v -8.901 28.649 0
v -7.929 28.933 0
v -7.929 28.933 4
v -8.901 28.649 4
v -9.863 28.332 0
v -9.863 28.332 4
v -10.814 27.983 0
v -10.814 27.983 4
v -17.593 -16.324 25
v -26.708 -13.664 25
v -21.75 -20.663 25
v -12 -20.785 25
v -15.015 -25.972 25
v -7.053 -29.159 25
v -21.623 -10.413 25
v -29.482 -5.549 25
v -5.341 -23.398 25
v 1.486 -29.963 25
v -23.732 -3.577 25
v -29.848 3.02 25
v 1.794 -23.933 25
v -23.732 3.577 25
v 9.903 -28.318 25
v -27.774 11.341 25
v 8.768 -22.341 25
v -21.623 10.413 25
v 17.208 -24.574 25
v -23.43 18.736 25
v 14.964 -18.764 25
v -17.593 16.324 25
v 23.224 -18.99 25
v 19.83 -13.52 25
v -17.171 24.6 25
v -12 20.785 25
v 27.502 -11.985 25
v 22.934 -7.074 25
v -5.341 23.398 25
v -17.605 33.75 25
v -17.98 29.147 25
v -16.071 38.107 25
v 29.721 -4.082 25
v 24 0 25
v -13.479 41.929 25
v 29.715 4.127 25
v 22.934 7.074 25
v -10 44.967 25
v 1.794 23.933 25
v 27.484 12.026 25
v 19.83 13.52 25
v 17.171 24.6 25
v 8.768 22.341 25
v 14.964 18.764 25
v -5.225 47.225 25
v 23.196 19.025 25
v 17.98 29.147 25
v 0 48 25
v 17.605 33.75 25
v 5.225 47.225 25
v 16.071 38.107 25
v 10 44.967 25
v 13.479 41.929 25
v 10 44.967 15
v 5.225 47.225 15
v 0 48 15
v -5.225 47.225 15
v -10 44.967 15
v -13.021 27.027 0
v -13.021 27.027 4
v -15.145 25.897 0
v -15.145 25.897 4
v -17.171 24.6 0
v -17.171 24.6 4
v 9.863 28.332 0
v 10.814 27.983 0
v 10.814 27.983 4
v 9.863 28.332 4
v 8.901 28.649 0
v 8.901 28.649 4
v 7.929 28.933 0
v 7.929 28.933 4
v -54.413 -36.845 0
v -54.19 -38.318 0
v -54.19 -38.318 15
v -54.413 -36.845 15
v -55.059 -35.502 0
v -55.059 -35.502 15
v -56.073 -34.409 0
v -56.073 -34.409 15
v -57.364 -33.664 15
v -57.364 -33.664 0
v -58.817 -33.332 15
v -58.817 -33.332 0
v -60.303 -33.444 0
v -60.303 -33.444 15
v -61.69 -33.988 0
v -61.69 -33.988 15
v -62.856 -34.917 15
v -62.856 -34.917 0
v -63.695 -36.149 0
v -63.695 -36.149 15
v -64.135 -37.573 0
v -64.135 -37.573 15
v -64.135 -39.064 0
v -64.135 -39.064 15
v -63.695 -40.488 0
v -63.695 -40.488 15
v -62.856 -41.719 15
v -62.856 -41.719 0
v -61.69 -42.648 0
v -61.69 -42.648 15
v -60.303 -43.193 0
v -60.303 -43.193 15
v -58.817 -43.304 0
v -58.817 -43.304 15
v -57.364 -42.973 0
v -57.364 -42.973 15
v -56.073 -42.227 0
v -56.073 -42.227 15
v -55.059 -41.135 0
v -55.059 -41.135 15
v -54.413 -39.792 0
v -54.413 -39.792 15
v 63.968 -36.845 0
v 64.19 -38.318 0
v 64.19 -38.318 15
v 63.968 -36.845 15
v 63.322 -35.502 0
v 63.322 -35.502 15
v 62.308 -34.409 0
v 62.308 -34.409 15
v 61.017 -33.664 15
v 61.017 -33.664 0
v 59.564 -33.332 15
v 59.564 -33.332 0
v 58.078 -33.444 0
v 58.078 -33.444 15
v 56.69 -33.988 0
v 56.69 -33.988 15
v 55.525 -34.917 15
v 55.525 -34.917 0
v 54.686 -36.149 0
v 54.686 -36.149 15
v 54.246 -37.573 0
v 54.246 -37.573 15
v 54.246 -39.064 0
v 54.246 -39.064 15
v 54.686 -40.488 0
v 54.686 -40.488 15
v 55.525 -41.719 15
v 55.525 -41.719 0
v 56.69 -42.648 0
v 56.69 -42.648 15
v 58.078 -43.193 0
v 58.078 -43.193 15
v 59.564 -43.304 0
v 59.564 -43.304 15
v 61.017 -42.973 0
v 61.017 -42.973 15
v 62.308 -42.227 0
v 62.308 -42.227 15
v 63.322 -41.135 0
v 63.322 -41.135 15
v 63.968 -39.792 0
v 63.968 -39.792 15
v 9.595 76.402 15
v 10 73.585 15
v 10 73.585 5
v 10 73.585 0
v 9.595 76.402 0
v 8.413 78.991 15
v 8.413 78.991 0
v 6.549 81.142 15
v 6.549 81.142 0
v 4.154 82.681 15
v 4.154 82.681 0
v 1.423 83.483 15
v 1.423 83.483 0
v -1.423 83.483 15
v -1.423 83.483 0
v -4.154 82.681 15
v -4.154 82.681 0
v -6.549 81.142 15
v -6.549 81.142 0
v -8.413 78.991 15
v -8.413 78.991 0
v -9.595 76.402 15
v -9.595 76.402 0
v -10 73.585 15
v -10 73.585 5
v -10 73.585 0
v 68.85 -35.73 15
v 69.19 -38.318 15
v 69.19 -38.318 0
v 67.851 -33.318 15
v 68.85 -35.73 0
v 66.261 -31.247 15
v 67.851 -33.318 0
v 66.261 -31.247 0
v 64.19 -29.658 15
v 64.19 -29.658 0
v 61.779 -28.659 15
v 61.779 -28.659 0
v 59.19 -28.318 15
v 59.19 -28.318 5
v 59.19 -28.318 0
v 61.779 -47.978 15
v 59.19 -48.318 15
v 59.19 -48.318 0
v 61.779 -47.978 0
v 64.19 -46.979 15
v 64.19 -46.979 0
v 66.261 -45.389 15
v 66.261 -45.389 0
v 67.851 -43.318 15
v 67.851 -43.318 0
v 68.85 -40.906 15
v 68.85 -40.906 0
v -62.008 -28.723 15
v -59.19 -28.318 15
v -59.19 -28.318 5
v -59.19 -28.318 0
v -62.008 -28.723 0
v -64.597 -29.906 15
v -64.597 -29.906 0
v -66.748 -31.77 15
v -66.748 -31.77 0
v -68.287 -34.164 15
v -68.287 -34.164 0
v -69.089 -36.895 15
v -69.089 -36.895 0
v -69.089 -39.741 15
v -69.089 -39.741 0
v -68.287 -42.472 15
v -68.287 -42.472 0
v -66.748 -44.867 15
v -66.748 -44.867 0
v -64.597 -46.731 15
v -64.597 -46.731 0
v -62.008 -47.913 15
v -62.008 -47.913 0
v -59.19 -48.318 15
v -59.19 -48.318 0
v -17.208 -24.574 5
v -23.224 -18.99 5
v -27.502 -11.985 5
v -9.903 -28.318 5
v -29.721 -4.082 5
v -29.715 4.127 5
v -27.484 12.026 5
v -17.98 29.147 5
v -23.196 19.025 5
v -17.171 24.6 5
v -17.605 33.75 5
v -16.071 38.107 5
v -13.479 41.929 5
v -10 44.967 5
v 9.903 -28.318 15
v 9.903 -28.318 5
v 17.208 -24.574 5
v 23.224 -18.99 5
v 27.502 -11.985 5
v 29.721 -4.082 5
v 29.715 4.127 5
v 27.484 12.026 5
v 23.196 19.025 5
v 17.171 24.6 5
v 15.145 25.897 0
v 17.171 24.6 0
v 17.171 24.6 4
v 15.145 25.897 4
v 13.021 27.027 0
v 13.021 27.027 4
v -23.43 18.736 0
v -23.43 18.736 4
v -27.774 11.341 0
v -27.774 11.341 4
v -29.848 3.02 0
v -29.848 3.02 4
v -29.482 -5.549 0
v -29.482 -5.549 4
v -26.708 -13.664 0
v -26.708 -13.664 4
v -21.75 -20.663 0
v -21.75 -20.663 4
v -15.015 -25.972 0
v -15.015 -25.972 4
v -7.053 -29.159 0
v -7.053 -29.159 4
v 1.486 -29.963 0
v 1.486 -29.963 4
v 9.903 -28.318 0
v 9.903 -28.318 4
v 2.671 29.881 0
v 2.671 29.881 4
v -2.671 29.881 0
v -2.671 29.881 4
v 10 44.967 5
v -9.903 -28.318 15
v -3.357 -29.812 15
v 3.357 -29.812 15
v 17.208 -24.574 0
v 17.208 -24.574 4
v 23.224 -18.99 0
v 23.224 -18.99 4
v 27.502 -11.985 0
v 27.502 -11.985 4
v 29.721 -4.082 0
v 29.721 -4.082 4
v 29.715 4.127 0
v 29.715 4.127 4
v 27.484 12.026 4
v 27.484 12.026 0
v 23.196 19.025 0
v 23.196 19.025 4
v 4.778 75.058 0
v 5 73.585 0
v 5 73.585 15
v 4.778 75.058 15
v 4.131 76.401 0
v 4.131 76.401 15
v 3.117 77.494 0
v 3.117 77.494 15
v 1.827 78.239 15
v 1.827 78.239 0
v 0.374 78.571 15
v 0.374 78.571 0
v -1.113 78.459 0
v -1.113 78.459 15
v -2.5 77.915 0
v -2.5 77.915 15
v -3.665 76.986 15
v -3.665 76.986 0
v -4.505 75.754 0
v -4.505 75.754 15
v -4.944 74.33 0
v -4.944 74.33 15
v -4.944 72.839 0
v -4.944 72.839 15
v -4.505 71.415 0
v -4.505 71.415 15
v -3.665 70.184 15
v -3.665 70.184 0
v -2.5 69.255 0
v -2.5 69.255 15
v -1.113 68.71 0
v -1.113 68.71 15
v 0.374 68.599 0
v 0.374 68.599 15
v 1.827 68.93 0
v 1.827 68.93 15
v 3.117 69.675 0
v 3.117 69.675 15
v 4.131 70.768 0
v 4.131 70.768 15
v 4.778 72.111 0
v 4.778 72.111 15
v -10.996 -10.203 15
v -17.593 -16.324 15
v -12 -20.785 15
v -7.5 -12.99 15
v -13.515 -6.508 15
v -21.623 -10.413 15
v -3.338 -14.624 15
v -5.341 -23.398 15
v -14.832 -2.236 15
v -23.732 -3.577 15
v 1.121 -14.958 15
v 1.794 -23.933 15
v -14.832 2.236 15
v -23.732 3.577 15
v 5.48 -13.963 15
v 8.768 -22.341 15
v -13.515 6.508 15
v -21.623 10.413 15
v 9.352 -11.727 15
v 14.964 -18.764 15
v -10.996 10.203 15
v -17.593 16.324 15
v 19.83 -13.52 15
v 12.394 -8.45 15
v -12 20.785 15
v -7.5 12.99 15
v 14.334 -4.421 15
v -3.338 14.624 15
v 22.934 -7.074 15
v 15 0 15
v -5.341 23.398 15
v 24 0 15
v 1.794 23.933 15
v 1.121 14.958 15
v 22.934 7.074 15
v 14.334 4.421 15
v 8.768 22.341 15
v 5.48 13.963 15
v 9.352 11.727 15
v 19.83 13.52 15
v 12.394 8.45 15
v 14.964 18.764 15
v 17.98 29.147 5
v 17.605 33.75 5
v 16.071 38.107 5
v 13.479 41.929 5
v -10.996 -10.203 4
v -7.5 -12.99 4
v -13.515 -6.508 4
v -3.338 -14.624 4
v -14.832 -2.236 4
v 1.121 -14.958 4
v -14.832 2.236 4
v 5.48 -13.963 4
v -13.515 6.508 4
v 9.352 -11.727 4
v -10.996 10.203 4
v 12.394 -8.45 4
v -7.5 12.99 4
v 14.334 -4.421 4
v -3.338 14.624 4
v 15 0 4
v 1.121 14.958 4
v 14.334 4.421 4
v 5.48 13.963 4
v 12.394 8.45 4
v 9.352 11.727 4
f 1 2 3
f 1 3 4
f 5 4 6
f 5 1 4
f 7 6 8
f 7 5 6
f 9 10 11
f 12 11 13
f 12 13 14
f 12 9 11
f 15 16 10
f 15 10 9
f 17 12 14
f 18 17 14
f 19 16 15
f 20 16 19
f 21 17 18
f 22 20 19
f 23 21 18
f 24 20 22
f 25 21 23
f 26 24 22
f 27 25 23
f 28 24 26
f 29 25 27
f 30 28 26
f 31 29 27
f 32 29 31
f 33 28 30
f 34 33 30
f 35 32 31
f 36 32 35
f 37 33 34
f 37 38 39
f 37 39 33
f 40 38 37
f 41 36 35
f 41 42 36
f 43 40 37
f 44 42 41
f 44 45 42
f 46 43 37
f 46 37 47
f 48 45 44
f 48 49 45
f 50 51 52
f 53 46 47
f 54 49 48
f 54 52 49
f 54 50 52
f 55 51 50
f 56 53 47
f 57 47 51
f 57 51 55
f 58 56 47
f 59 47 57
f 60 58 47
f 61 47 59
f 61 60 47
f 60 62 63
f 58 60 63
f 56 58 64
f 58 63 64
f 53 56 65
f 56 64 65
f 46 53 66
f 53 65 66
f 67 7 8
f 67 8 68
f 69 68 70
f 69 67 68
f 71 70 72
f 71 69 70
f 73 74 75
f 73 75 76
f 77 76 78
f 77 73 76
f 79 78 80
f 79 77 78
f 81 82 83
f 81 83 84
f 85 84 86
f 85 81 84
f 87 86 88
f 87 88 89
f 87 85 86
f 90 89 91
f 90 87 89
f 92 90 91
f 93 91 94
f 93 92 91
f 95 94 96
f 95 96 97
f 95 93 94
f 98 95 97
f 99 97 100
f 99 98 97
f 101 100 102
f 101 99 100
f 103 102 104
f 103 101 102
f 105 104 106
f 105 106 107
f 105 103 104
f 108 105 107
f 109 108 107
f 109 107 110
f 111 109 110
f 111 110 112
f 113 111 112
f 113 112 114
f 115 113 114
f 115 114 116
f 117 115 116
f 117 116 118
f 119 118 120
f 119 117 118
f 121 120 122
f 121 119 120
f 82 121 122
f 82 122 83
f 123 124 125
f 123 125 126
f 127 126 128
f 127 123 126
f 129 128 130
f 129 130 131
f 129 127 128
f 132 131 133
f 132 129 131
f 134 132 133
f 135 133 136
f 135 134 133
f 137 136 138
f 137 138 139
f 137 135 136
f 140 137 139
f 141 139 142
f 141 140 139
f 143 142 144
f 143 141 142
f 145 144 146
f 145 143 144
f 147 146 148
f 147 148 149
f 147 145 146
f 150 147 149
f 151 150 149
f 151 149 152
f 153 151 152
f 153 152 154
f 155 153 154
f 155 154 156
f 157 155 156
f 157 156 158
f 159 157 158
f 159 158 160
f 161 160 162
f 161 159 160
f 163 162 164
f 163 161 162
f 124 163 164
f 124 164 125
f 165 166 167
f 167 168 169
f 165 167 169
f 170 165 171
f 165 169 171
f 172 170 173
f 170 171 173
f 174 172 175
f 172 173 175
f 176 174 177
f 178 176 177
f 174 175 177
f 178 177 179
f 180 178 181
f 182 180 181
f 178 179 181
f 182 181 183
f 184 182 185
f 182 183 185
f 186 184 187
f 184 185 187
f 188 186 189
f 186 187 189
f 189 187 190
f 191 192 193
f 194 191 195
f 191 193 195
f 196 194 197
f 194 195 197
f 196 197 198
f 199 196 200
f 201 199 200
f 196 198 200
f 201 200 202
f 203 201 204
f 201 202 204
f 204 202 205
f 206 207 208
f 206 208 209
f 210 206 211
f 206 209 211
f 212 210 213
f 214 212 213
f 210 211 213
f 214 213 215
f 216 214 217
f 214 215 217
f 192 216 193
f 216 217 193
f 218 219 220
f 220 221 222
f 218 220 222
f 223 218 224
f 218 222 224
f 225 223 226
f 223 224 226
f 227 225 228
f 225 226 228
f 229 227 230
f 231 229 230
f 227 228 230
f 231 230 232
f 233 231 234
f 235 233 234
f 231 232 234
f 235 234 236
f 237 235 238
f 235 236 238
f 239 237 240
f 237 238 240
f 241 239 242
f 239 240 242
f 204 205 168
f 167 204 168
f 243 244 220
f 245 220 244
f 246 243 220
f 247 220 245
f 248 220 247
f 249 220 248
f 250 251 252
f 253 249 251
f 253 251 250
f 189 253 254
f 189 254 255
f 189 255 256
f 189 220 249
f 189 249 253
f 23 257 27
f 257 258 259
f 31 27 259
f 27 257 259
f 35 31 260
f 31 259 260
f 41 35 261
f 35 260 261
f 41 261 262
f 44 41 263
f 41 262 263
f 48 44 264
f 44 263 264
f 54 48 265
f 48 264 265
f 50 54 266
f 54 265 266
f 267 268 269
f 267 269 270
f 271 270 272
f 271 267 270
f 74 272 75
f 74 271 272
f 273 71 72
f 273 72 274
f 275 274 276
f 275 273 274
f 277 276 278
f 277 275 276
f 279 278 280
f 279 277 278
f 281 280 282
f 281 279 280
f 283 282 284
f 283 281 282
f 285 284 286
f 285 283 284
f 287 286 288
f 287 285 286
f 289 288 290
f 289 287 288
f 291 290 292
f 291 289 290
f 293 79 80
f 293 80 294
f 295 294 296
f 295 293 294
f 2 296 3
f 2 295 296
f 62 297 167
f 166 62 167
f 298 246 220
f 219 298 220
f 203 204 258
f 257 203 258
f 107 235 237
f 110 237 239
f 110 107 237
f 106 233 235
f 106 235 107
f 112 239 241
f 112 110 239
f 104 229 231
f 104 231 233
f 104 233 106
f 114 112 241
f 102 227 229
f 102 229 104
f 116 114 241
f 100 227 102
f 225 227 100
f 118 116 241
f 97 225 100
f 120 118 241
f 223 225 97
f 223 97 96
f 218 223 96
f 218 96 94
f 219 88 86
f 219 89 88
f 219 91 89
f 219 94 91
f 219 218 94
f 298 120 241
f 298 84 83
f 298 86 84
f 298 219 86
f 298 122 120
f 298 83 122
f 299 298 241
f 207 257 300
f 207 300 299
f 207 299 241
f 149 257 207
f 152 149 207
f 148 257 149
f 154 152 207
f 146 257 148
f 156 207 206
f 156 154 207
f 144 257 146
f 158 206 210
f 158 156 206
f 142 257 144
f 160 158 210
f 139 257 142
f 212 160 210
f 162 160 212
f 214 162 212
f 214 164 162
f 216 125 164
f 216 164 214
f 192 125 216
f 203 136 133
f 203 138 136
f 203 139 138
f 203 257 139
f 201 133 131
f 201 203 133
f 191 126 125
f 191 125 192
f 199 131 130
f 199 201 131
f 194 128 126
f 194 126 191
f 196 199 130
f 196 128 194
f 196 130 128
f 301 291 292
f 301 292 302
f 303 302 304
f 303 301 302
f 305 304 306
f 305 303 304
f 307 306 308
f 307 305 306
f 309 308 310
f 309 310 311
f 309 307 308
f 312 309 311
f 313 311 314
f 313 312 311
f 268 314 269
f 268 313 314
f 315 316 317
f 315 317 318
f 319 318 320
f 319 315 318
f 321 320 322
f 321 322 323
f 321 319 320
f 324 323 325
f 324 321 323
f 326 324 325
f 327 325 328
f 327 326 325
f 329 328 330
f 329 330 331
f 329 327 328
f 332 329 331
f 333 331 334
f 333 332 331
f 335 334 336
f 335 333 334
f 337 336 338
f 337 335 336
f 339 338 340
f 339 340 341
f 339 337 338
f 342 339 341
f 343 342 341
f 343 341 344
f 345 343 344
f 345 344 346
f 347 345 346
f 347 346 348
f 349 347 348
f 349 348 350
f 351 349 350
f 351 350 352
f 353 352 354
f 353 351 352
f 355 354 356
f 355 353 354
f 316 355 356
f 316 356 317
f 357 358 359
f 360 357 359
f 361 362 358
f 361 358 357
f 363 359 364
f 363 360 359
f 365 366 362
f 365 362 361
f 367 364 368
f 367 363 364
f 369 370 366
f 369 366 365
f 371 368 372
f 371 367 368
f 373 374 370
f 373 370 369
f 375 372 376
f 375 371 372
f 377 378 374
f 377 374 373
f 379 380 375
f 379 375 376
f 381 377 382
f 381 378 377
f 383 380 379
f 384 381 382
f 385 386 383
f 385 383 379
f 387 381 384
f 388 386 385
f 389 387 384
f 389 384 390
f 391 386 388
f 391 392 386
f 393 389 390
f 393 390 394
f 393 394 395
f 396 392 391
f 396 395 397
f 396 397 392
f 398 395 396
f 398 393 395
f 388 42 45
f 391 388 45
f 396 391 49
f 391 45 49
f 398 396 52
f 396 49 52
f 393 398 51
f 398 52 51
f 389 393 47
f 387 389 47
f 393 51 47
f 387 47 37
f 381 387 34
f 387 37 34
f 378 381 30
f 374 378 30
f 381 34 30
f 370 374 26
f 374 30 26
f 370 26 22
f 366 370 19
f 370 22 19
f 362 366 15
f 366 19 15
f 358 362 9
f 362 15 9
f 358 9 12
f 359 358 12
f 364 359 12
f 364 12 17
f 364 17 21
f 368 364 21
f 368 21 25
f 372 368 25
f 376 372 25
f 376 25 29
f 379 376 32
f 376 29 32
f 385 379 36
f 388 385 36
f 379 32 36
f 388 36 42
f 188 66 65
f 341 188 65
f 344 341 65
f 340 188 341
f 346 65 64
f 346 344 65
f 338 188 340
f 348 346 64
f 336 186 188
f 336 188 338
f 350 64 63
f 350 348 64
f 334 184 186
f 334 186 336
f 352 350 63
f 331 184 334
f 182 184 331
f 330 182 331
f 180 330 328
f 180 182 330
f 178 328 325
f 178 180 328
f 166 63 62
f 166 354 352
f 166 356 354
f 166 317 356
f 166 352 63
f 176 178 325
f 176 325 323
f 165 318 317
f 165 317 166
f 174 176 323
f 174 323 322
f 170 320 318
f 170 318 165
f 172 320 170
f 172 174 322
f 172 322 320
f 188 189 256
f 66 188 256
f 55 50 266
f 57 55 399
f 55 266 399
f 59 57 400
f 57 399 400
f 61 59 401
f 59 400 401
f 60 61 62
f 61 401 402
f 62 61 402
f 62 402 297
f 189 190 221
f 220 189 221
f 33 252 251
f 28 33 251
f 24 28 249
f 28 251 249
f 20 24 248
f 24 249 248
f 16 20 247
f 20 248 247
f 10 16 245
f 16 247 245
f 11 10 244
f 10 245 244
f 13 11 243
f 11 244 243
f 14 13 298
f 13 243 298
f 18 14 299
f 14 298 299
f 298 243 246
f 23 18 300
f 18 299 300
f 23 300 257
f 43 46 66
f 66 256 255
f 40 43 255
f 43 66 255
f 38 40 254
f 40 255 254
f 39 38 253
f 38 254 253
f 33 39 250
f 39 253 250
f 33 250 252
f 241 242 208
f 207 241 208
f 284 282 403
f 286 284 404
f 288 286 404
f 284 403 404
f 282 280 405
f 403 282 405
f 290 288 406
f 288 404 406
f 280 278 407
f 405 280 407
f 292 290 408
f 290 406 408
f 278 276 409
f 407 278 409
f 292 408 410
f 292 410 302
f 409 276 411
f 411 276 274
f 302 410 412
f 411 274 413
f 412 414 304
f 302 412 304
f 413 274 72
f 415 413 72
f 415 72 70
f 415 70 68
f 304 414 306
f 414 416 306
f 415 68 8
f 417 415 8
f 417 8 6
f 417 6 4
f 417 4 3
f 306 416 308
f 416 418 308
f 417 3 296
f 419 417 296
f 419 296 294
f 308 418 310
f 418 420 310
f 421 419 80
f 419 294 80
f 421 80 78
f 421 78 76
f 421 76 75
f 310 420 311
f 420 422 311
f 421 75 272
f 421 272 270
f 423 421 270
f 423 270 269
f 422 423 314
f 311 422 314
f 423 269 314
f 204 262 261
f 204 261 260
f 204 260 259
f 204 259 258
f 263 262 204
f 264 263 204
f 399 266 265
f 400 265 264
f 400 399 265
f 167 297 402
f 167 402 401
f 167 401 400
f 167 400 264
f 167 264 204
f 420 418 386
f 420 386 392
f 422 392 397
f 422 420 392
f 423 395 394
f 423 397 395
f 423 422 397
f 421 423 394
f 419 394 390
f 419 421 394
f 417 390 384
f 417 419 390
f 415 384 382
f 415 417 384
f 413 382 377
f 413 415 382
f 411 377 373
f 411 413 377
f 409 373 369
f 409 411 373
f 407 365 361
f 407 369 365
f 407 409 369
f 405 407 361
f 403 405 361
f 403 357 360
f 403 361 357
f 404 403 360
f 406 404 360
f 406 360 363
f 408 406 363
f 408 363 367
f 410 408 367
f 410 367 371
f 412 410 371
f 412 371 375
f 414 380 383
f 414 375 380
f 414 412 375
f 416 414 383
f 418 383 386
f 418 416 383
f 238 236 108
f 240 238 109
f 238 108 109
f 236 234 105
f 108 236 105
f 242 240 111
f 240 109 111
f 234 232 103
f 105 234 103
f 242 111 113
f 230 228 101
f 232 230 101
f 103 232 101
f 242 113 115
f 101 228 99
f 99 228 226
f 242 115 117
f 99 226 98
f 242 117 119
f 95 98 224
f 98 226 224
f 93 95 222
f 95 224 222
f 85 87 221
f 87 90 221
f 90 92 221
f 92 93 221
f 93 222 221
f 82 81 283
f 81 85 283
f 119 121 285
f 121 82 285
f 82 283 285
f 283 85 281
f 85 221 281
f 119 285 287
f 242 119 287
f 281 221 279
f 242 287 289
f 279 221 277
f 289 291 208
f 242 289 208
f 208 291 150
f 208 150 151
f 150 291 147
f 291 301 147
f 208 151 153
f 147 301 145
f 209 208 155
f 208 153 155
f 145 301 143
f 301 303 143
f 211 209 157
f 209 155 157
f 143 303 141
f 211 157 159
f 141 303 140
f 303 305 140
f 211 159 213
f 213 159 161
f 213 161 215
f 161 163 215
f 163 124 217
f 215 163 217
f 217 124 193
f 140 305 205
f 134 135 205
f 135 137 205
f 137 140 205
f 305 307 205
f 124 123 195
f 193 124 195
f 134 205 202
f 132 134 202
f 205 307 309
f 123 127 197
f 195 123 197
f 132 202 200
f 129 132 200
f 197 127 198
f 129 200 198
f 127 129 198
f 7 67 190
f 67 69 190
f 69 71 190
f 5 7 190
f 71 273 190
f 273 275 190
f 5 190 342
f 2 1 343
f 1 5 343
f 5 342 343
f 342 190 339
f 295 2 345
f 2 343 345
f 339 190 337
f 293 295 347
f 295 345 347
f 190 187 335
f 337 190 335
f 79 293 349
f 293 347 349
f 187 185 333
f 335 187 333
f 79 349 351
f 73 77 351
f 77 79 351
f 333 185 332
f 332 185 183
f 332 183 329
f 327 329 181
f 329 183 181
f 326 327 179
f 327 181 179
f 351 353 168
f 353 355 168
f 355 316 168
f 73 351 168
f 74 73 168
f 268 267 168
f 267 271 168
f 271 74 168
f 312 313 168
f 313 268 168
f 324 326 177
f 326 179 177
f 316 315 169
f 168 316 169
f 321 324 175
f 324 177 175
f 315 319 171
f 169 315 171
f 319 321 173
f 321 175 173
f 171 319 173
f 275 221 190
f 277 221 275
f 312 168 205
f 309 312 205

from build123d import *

# Parameters (mm, degrees)
F0_R     = 18
F0_R_2   = 15
F1_DEPTH = 25
F0_R_3   = 5
F2_DEPTH = 15
F3_DEPTH = 5
F4_R     = 24
F5_DEPTH = 10
F6_R     = 18
F7_DEPTH = 4
F8_DEPTH = 25


# Not quite as in the source:
# - a feature of the source that left no trace in its solid (it failed there, or was rolled back) is left out


with BuildPart() as f1:
    # F0 (on Top) → F1 (new body)
    with BuildSketch(Plane.XY):
        with BuildLine():
            ThreePointArc((11, 30), (10.9532905474, 28.9873667079), (10.8135588756, 27.9833333333))
            ThreePointArc((10.8135588756, 27.9833333333), (14.0941228696, 26.4831210498), (17.1709056255, 24.6))
            ThreePointArc((17.1709056255, 24.6), (16.9783517429, 35.9779237278), (10, 44.9666295471))
            ThreePointArc((10, 44.9666295471), (0, 48), (-10, 44.9666295471))
            ThreePointArc((-10, 44.9666295471), (-16.9783517429, 35.9779237278), (-17.1709056255, 24.6))
            ThreePointArc((-17.1709056255, 24.6), (-14.0941228696, 26.4831210498), (-10.8135588756, 27.9833333333))
            ThreePointArc((-10.8135588756, 27.9833333333), (-1.0126332921, 40.9532905474), (11, 30))
        make_face()
        with BuildLine():
            ThreePointArc((-7.9285699986, 28.9333333333), (0, 30), (7.9285699986, 28.9333333333))
            ThreePointArc((7.9285699986, 28.9333333333), (7.9821225244, 29.4654721656), (8, 30))
            ThreePointArc((8, 30), (-0.5345278344, 37.9821225244), (-7.9285699986, 28.9333333333))
        make_face()
        with BuildLine():
            ThreePointArc((7.9285699986, 28.9333333333), (9.3830951015, 28.4948684208), (10.8135588756, 27.9833333333))
            ThreePointArc((10.8135588756, 27.9833333333), (10.9532905474, 28.9873667079), (11, 30))
            ThreePointArc((11, 30), (-1.0126332921, 40.9532905474), (-10.8135588756, 27.9833333333))
            ThreePointArc((-10.8135588756, 27.9833333333), (-9.3830951015, 28.4948684208), (-7.9285699986, 28.9333333333))
            ThreePointArc((-7.9285699986, 28.9333333333), (-0.5345278344, 37.9821225244), (8, 30))
            ThreePointArc((8, 30), (7.9821225244, 29.4654721656), (7.9285699986, 28.9333333333))
        make_face()
        with BuildLine():
            ThreePointArc((8.1236109924, 22.5833333333), (19.6337294447, 13.8027775499), (24, 0))
            ThreePointArc((24, 0), (-13.8027775499, -19.6337294447), (-8.1236109924, 22.5833333333))
            ThreePointArc((-8.1236109924, 22.5833333333), (-9.8460195334, 25.0953186293), (-10.8135588756, 27.9833333333))
            ThreePointArc((-10.8135588756, 27.9833333333), (-14.0941228696, 26.4831210498), (-17.1709056255, 24.6))
            ThreePointArc((-17.1709056255, 24.6), (-29.7210146782, -4.0818239184), (-9.9032129289, -28.3183045694))
            ThreePointArc((-9.9032129289, -28.3183045694), (0, -30), (9.9032129289, -28.3183045694))
            ThreePointArc((9.9032129289, -28.3183045694), (24.4652446122, -17.3623675248), (30, 0))
            ThreePointArc((30, 0), (26.6000673755, 13.8721453142), (17.1709056255, 24.6))
            ThreePointArc((17.1709056255, 24.6), (14.0941228696, 26.4831210498), (10.8135588756, 27.9833333333))
            ThreePointArc((10.8135588756, 27.9833333333), (9.8460195334, 25.0953186293), (8.1236109924, 22.5833333333))
        make_face()
        with BuildLine():
            ThreePointArc((-8.1236109924, 22.5833333333), (-13.8027775499, -19.6337294447), (24, 0))
            ThreePointArc((24, 0), (19.6337294447, 13.8027775499), (8.1236109924, 22.5833333333))
            ThreePointArc((8.1236109924, 22.5833333333), (0, 19), (-8.1236109924, 22.5833333333))
        make_face()
        Circle(F0_R, mode=Mode.SUBTRACT)
        Circle(F0_R)
        Circle(F0_R_2, mode=Mode.SUBTRACT)
        Circle(F0_R_2)
        with BuildLine():
            ThreePointArc((-8.1236109924, 22.5833333333), (0, 19), (8.1236109924, 22.5833333333))
            ThreePointArc((8.1236109924, 22.5833333333), (6.4342628666, 23.1214242936), (4.7098006563, 23.5333333333))
            ThreePointArc((4.7098006563, 23.5333333333), (0, 22), (-4.7098006563, 23.5333333333))
            ThreePointArc((-4.7098006563, 23.5333333333), (-6.4342628666, 23.1214242936), (-8.1236109924, 22.5833333333))
        make_face()
        with BuildLine():
            ThreePointArc((4.7098006563, 23.5333333333), (6.4342628666, 23.1214242936), (8.1236109924, 22.5833333333))
            ThreePointArc((8.1236109924, 22.5833333333), (9.8460195334, 25.0953186293), (10.8135588756, 27.9833333333))
            ThreePointArc((10.8135588756, 27.9833333333), (9.3830951015, 28.4948684208), (7.9285699986, 28.9333333333))
            ThreePointArc((7.9285699986, 28.9333333333), (6.8718340494, 25.9039168957), (4.7098006563, 23.5333333333))
        make_face()
        with BuildLine():
            ThreePointArc((-10.8135588756, 27.9833333333), (-9.8460195334, 25.0953186293), (-8.1236109924, 22.5833333333))
            ThreePointArc((-8.1236109924, 22.5833333333), (-6.4342628666, 23.1214242936), (-4.7098006563, 23.5333333333))
            ThreePointArc((-4.7098006563, 23.5333333333), (-6.8718340494, 25.9039168957), (-7.9285699986, 28.9333333333))
            ThreePointArc((-7.9285699986, 28.9333333333), (-9.3830951015, 28.4948684208), (-10.8135588756, 27.9833333333))
        make_face()
        with BuildLine():
            ThreePointArc((-4.7098006563, 23.5333333333), (0, 24), (4.7098006563, 23.5333333333))
            ThreePointArc((4.7098006563, 23.5333333333), (6.8718340494, 25.9039168957), (7.9285699986, 28.9333333333))
            ThreePointArc((7.9285699986, 28.9333333333), (0, 30), (-7.9285699986, 28.9333333333))
            ThreePointArc((-7.9285699986, 28.9333333333), (-6.8718340494, 25.9039168957), (-4.7098006563, 23.5333333333))
        make_face()
        with BuildLine():
            ThreePointArc((-4.7098006563, 23.5333333333), (0, 22), (4.7098006563, 23.5333333333))
            ThreePointArc((4.7098006563, 23.5333333333), (0, 24), (-4.7098006563, 23.5333333333))
        make_face()
    extrude(amount=F1_DEPTH)

    # F0 (on Top) → F2 (join)
    with BuildSketch(Plane.XY):
        with BuildLine():
            ThreePointArc((9.9032129289, -28.3183045694), (0, -30), (-9.9032129289, -28.3183045694))
            Line((-9.9032129289, -28.3183045694), (-59.1904185712, -28.3183045694))
            ThreePointArc((-59.1904185712, -28.3183045694), (-52.1193507594, -31.2472367575), (-49.1904185712, -38.3183045694))
            ThreePointArc((-49.1904185712, -38.3183045694), (-52.1193507594, -45.3893723813), (-59.1904185712, -48.3183045694))
            Line((-59.1904185712, -48.3183045694), (0, -48.3183045694))
            Line((0, -48.3183045694), (59.1904185712, -48.3183045694))
            ThreePointArc((59.1904185712, -48.3183045694), (49.1904185712, -38.3183045694), (59.1904185712, -28.3183045694))
            Line((59.1904185712, -28.3183045694), (9.9032129289, -28.3183045694))
        make_face()
        with BuildLine():
            ThreePointArc((-49.1904185712, -38.3183045694), (-52.1193507594, -31.2472367575), (-59.1904185712, -28.3183045694))
            ThreePointArc((-59.1904185712, -28.3183045694), (-69.1904185712, -38.3183045694), (-59.1904185712, -48.3183045694))
            ThreePointArc((-59.1904185712, -48.3183045694), (-52.1193507594, -45.3893723813), (-49.1904185712, -38.3183045694))
        make_face()
        with Locations((-59.1904185712, -38.3183045694)):
            Circle(F0_R_3, mode=Mode.SUBTRACT)
        with BuildLine():
            ThreePointArc((69.1904185712, -38.3183045694), (66.2614863831, -31.2472367575), (59.1904185712, -28.3183045694))
            ThreePointArc((59.1904185712, -28.3183045694), (49.1904185712, -38.3183045694), (59.1904185712, -48.3183045694))
            ThreePointArc((59.1904185712, -48.3183045694), (66.2614863831, -45.3893723813), (69.1904185712, -38.3183045694))
        make_face()
        with Locations((59.1904185712, -38.3183045694)):
            Circle(F0_R_3, mode=Mode.SUBTRACT)
        with BuildLine():
            ThreePointArc((-10, 44.9666295471), (0, 48), (10, 44.9666295471))
            Line((10, 44.9666295471), (10, 73.5846459866))
            ThreePointArc((10, 73.5846459866), (0, 63.5846459866), (-10, 73.5846459866))
            Line((-10, 73.5846459866), (-10, 44.9666295471))
        make_face()
        with BuildLine():
            ThreePointArc((-10, 73.5846459866), (0, 63.5846459866), (10, 73.5846459866))
            ThreePointArc((10, 73.5846459866), (0, 83.5846459866), (-10, 73.5846459866))
        make_face()
        with Locations((0, 73.5846459866)):
            Circle(F0_R_3, mode=Mode.SUBTRACT)
    extrude(amount=F2_DEPTH)

    # F0 (on Top) → F3 (join)
    with BuildSketch(Plane.XY):
        with BuildLine():
            ThreePointArc((-9.9032129289, -28.3183045694), (-29.7210146782, -4.0818239184), (-17.1709056255, 24.6))
            ThreePointArc((-17.1709056255, 24.6), (-16.9783517429, 35.9779237278), (-10, 44.9666295471))
            Line((-10, 44.9666295471), (-10, 73.5846459866))
            Line((-10, 73.5846459866), (-59.1904185712, -28.3183045694))
            Line((-59.1904185712, -28.3183045694), (-9.9032129289, -28.3183045694))
        make_face()
        with BuildLine():
            ThreePointArc((10, 44.9666295471), (16.9783517429, 35.9779237278), (17.1709056255, 24.6))
            ThreePointArc((17.1709056255, 24.6), (26.6000673755, 13.8721453142), (30, 0))
            ThreePointArc((30, 0), (24.4652446122, -17.3623675248), (9.9032129289, -28.3183045694))
            Line((9.9032129289, -28.3183045694), (59.1904185712, -28.3183045694))
            Line((59.1904185712, -28.3183045694), (10, 73.5846459866))
            Line((10, 73.5846459866), (10, 44.9666295471))
        make_face()
    extrude(amount=F3_DEPTH)

    # F4 (on face) → F5 (cut)
    with BuildSketch(Plane.XY.offset(25)):
        Circle(F4_R)
    extrude(amount=-F5_DEPTH, mode=Mode.SUBTRACT)

    # F6 (on face) + F0 (on Top) → F7 (cut)
    with BuildSketch(Plane.XY):
        with BuildLine():
            ThreePointArc((10.8135588756, 27.9833333333), (9.8460195334, 25.0953186293), (8.1236109924, 22.5833333333))
            ThreePointArc((8.1236109924, 22.5833333333), (0, -24), (-8.1236109924, 22.5833333333))
            ThreePointArc((-8.1236109924, 22.5833333333), (-9.8460195334, 25.0953186293), (-10.8135588756, 27.9833333333))
            ThreePointArc((-10.8135588756, 27.9833333333), (-14.0941228696, 26.4831210498), (-17.1709056255, 24.6))
            ThreePointArc((-17.1709056255, 24.6), (-29.7210146782, -4.0818239184), (-9.9032129289, -28.3183045694))
            ThreePointArc((-9.9032129289, -28.3183045694), (0, -30), (9.9032129289, -28.3183045694))
            ThreePointArc((9.9032129289, -28.3183045694), (29.7210146782, -4.0818239184), (17.1709056255, 24.6))
            ThreePointArc((17.1709056255, 24.6), (14.0941228696, 26.4831210498), (10.8135588756, 27.9833333333))
        make_face()
        Circle(F6_R)
    with BuildSketch(Plane.XY):
        with BuildLine():
            ThreePointArc((-8.1236109924, 22.5833333333), (-13.8027775499, -19.6337294447), (24, 0))
            ThreePointArc((24, 0), (19.6337294447, 13.8027775499), (8.1236109924, 22.5833333333))
            ThreePointArc((8.1236109924, 22.5833333333), (0, 19), (-8.1236109924, 22.5833333333))
        make_face()
        Circle(F0_R, mode=Mode.SUBTRACT)
        Circle(F0_R)
        Circle(F0_R_2, mode=Mode.SUBTRACT)
        with BuildLine():
            ThreePointArc((-4.7098006563, 23.5333333333), (0, 24), (4.7098006563, 23.5333333333))
            ThreePointArc((4.7098006563, 23.5333333333), (6.8718340494, 25.9039168957), (7.9285699986, 28.9333333333))
            ThreePointArc((7.9285699986, 28.9333333333), (0, 30), (-7.9285699986, 28.9333333333))
            ThreePointArc((-7.9285699986, 28.9333333333), (-6.8718340494, 25.9039168957), (-4.7098006563, 23.5333333333))
        make_face()
        with BuildLine():
            ThreePointArc((-8.1236109924, 22.5833333333), (0, 19), (8.1236109924, 22.5833333333))
            ThreePointArc((8.1236109924, 22.5833333333), (6.4342628666, 23.1214242936), (4.7098006563, 23.5333333333))
            ThreePointArc((4.7098006563, 23.5333333333), (0, 22), (-4.7098006563, 23.5333333333))
            ThreePointArc((-4.7098006563, 23.5333333333), (-6.4342628666, 23.1214242936), (-8.1236109924, 22.5833333333))
        make_face()
        with BuildLine():
            ThreePointArc((-10.8135588756, 27.9833333333), (-9.8460195334, 25.0953186293), (-8.1236109924, 22.5833333333))
            ThreePointArc((-8.1236109924, 22.5833333333), (-6.4342628666, 23.1214242936), (-4.7098006563, 23.5333333333))
            ThreePointArc((-4.7098006563, 23.5333333333), (-6.8718340494, 25.9039168957), (-7.9285699986, 28.9333333333))
            ThreePointArc((-7.9285699986, 28.9333333333), (-9.3830951015, 28.4948684208), (-10.8135588756, 27.9833333333))
        make_face()
        with BuildLine():
            ThreePointArc((4.7098006563, 23.5333333333), (6.4342628666, 23.1214242936), (8.1236109924, 22.5833333333))
            ThreePointArc((8.1236109924, 22.5833333333), (9.8460195334, 25.0953186293), (10.8135588756, 27.9833333333))
            ThreePointArc((10.8135588756, 27.9833333333), (9.3830951015, 28.4948684208), (7.9285699986, 28.9333333333))
            ThreePointArc((7.9285699986, 28.9333333333), (6.8718340494, 25.9039168957), (4.7098006563, 23.5333333333))
        make_face()
        with BuildLine():
            ThreePointArc((-4.7098006563, 23.5333333333), (0, 22), (4.7098006563, 23.5333333333))
            ThreePointArc((4.7098006563, 23.5333333333), (0, 24), (-4.7098006563, 23.5333333333))
        make_face()
    extrude(amount=F7_DEPTH, mode=Mode.SUBTRACT)

    # F0 (on Top) → F8 (cut)
    with BuildSketch(Plane.XY):
        Circle(F0_R_2)
    extrude(amount=F8_DEPTH, mode=Mode.SUBTRACT)


solid = f1.part
